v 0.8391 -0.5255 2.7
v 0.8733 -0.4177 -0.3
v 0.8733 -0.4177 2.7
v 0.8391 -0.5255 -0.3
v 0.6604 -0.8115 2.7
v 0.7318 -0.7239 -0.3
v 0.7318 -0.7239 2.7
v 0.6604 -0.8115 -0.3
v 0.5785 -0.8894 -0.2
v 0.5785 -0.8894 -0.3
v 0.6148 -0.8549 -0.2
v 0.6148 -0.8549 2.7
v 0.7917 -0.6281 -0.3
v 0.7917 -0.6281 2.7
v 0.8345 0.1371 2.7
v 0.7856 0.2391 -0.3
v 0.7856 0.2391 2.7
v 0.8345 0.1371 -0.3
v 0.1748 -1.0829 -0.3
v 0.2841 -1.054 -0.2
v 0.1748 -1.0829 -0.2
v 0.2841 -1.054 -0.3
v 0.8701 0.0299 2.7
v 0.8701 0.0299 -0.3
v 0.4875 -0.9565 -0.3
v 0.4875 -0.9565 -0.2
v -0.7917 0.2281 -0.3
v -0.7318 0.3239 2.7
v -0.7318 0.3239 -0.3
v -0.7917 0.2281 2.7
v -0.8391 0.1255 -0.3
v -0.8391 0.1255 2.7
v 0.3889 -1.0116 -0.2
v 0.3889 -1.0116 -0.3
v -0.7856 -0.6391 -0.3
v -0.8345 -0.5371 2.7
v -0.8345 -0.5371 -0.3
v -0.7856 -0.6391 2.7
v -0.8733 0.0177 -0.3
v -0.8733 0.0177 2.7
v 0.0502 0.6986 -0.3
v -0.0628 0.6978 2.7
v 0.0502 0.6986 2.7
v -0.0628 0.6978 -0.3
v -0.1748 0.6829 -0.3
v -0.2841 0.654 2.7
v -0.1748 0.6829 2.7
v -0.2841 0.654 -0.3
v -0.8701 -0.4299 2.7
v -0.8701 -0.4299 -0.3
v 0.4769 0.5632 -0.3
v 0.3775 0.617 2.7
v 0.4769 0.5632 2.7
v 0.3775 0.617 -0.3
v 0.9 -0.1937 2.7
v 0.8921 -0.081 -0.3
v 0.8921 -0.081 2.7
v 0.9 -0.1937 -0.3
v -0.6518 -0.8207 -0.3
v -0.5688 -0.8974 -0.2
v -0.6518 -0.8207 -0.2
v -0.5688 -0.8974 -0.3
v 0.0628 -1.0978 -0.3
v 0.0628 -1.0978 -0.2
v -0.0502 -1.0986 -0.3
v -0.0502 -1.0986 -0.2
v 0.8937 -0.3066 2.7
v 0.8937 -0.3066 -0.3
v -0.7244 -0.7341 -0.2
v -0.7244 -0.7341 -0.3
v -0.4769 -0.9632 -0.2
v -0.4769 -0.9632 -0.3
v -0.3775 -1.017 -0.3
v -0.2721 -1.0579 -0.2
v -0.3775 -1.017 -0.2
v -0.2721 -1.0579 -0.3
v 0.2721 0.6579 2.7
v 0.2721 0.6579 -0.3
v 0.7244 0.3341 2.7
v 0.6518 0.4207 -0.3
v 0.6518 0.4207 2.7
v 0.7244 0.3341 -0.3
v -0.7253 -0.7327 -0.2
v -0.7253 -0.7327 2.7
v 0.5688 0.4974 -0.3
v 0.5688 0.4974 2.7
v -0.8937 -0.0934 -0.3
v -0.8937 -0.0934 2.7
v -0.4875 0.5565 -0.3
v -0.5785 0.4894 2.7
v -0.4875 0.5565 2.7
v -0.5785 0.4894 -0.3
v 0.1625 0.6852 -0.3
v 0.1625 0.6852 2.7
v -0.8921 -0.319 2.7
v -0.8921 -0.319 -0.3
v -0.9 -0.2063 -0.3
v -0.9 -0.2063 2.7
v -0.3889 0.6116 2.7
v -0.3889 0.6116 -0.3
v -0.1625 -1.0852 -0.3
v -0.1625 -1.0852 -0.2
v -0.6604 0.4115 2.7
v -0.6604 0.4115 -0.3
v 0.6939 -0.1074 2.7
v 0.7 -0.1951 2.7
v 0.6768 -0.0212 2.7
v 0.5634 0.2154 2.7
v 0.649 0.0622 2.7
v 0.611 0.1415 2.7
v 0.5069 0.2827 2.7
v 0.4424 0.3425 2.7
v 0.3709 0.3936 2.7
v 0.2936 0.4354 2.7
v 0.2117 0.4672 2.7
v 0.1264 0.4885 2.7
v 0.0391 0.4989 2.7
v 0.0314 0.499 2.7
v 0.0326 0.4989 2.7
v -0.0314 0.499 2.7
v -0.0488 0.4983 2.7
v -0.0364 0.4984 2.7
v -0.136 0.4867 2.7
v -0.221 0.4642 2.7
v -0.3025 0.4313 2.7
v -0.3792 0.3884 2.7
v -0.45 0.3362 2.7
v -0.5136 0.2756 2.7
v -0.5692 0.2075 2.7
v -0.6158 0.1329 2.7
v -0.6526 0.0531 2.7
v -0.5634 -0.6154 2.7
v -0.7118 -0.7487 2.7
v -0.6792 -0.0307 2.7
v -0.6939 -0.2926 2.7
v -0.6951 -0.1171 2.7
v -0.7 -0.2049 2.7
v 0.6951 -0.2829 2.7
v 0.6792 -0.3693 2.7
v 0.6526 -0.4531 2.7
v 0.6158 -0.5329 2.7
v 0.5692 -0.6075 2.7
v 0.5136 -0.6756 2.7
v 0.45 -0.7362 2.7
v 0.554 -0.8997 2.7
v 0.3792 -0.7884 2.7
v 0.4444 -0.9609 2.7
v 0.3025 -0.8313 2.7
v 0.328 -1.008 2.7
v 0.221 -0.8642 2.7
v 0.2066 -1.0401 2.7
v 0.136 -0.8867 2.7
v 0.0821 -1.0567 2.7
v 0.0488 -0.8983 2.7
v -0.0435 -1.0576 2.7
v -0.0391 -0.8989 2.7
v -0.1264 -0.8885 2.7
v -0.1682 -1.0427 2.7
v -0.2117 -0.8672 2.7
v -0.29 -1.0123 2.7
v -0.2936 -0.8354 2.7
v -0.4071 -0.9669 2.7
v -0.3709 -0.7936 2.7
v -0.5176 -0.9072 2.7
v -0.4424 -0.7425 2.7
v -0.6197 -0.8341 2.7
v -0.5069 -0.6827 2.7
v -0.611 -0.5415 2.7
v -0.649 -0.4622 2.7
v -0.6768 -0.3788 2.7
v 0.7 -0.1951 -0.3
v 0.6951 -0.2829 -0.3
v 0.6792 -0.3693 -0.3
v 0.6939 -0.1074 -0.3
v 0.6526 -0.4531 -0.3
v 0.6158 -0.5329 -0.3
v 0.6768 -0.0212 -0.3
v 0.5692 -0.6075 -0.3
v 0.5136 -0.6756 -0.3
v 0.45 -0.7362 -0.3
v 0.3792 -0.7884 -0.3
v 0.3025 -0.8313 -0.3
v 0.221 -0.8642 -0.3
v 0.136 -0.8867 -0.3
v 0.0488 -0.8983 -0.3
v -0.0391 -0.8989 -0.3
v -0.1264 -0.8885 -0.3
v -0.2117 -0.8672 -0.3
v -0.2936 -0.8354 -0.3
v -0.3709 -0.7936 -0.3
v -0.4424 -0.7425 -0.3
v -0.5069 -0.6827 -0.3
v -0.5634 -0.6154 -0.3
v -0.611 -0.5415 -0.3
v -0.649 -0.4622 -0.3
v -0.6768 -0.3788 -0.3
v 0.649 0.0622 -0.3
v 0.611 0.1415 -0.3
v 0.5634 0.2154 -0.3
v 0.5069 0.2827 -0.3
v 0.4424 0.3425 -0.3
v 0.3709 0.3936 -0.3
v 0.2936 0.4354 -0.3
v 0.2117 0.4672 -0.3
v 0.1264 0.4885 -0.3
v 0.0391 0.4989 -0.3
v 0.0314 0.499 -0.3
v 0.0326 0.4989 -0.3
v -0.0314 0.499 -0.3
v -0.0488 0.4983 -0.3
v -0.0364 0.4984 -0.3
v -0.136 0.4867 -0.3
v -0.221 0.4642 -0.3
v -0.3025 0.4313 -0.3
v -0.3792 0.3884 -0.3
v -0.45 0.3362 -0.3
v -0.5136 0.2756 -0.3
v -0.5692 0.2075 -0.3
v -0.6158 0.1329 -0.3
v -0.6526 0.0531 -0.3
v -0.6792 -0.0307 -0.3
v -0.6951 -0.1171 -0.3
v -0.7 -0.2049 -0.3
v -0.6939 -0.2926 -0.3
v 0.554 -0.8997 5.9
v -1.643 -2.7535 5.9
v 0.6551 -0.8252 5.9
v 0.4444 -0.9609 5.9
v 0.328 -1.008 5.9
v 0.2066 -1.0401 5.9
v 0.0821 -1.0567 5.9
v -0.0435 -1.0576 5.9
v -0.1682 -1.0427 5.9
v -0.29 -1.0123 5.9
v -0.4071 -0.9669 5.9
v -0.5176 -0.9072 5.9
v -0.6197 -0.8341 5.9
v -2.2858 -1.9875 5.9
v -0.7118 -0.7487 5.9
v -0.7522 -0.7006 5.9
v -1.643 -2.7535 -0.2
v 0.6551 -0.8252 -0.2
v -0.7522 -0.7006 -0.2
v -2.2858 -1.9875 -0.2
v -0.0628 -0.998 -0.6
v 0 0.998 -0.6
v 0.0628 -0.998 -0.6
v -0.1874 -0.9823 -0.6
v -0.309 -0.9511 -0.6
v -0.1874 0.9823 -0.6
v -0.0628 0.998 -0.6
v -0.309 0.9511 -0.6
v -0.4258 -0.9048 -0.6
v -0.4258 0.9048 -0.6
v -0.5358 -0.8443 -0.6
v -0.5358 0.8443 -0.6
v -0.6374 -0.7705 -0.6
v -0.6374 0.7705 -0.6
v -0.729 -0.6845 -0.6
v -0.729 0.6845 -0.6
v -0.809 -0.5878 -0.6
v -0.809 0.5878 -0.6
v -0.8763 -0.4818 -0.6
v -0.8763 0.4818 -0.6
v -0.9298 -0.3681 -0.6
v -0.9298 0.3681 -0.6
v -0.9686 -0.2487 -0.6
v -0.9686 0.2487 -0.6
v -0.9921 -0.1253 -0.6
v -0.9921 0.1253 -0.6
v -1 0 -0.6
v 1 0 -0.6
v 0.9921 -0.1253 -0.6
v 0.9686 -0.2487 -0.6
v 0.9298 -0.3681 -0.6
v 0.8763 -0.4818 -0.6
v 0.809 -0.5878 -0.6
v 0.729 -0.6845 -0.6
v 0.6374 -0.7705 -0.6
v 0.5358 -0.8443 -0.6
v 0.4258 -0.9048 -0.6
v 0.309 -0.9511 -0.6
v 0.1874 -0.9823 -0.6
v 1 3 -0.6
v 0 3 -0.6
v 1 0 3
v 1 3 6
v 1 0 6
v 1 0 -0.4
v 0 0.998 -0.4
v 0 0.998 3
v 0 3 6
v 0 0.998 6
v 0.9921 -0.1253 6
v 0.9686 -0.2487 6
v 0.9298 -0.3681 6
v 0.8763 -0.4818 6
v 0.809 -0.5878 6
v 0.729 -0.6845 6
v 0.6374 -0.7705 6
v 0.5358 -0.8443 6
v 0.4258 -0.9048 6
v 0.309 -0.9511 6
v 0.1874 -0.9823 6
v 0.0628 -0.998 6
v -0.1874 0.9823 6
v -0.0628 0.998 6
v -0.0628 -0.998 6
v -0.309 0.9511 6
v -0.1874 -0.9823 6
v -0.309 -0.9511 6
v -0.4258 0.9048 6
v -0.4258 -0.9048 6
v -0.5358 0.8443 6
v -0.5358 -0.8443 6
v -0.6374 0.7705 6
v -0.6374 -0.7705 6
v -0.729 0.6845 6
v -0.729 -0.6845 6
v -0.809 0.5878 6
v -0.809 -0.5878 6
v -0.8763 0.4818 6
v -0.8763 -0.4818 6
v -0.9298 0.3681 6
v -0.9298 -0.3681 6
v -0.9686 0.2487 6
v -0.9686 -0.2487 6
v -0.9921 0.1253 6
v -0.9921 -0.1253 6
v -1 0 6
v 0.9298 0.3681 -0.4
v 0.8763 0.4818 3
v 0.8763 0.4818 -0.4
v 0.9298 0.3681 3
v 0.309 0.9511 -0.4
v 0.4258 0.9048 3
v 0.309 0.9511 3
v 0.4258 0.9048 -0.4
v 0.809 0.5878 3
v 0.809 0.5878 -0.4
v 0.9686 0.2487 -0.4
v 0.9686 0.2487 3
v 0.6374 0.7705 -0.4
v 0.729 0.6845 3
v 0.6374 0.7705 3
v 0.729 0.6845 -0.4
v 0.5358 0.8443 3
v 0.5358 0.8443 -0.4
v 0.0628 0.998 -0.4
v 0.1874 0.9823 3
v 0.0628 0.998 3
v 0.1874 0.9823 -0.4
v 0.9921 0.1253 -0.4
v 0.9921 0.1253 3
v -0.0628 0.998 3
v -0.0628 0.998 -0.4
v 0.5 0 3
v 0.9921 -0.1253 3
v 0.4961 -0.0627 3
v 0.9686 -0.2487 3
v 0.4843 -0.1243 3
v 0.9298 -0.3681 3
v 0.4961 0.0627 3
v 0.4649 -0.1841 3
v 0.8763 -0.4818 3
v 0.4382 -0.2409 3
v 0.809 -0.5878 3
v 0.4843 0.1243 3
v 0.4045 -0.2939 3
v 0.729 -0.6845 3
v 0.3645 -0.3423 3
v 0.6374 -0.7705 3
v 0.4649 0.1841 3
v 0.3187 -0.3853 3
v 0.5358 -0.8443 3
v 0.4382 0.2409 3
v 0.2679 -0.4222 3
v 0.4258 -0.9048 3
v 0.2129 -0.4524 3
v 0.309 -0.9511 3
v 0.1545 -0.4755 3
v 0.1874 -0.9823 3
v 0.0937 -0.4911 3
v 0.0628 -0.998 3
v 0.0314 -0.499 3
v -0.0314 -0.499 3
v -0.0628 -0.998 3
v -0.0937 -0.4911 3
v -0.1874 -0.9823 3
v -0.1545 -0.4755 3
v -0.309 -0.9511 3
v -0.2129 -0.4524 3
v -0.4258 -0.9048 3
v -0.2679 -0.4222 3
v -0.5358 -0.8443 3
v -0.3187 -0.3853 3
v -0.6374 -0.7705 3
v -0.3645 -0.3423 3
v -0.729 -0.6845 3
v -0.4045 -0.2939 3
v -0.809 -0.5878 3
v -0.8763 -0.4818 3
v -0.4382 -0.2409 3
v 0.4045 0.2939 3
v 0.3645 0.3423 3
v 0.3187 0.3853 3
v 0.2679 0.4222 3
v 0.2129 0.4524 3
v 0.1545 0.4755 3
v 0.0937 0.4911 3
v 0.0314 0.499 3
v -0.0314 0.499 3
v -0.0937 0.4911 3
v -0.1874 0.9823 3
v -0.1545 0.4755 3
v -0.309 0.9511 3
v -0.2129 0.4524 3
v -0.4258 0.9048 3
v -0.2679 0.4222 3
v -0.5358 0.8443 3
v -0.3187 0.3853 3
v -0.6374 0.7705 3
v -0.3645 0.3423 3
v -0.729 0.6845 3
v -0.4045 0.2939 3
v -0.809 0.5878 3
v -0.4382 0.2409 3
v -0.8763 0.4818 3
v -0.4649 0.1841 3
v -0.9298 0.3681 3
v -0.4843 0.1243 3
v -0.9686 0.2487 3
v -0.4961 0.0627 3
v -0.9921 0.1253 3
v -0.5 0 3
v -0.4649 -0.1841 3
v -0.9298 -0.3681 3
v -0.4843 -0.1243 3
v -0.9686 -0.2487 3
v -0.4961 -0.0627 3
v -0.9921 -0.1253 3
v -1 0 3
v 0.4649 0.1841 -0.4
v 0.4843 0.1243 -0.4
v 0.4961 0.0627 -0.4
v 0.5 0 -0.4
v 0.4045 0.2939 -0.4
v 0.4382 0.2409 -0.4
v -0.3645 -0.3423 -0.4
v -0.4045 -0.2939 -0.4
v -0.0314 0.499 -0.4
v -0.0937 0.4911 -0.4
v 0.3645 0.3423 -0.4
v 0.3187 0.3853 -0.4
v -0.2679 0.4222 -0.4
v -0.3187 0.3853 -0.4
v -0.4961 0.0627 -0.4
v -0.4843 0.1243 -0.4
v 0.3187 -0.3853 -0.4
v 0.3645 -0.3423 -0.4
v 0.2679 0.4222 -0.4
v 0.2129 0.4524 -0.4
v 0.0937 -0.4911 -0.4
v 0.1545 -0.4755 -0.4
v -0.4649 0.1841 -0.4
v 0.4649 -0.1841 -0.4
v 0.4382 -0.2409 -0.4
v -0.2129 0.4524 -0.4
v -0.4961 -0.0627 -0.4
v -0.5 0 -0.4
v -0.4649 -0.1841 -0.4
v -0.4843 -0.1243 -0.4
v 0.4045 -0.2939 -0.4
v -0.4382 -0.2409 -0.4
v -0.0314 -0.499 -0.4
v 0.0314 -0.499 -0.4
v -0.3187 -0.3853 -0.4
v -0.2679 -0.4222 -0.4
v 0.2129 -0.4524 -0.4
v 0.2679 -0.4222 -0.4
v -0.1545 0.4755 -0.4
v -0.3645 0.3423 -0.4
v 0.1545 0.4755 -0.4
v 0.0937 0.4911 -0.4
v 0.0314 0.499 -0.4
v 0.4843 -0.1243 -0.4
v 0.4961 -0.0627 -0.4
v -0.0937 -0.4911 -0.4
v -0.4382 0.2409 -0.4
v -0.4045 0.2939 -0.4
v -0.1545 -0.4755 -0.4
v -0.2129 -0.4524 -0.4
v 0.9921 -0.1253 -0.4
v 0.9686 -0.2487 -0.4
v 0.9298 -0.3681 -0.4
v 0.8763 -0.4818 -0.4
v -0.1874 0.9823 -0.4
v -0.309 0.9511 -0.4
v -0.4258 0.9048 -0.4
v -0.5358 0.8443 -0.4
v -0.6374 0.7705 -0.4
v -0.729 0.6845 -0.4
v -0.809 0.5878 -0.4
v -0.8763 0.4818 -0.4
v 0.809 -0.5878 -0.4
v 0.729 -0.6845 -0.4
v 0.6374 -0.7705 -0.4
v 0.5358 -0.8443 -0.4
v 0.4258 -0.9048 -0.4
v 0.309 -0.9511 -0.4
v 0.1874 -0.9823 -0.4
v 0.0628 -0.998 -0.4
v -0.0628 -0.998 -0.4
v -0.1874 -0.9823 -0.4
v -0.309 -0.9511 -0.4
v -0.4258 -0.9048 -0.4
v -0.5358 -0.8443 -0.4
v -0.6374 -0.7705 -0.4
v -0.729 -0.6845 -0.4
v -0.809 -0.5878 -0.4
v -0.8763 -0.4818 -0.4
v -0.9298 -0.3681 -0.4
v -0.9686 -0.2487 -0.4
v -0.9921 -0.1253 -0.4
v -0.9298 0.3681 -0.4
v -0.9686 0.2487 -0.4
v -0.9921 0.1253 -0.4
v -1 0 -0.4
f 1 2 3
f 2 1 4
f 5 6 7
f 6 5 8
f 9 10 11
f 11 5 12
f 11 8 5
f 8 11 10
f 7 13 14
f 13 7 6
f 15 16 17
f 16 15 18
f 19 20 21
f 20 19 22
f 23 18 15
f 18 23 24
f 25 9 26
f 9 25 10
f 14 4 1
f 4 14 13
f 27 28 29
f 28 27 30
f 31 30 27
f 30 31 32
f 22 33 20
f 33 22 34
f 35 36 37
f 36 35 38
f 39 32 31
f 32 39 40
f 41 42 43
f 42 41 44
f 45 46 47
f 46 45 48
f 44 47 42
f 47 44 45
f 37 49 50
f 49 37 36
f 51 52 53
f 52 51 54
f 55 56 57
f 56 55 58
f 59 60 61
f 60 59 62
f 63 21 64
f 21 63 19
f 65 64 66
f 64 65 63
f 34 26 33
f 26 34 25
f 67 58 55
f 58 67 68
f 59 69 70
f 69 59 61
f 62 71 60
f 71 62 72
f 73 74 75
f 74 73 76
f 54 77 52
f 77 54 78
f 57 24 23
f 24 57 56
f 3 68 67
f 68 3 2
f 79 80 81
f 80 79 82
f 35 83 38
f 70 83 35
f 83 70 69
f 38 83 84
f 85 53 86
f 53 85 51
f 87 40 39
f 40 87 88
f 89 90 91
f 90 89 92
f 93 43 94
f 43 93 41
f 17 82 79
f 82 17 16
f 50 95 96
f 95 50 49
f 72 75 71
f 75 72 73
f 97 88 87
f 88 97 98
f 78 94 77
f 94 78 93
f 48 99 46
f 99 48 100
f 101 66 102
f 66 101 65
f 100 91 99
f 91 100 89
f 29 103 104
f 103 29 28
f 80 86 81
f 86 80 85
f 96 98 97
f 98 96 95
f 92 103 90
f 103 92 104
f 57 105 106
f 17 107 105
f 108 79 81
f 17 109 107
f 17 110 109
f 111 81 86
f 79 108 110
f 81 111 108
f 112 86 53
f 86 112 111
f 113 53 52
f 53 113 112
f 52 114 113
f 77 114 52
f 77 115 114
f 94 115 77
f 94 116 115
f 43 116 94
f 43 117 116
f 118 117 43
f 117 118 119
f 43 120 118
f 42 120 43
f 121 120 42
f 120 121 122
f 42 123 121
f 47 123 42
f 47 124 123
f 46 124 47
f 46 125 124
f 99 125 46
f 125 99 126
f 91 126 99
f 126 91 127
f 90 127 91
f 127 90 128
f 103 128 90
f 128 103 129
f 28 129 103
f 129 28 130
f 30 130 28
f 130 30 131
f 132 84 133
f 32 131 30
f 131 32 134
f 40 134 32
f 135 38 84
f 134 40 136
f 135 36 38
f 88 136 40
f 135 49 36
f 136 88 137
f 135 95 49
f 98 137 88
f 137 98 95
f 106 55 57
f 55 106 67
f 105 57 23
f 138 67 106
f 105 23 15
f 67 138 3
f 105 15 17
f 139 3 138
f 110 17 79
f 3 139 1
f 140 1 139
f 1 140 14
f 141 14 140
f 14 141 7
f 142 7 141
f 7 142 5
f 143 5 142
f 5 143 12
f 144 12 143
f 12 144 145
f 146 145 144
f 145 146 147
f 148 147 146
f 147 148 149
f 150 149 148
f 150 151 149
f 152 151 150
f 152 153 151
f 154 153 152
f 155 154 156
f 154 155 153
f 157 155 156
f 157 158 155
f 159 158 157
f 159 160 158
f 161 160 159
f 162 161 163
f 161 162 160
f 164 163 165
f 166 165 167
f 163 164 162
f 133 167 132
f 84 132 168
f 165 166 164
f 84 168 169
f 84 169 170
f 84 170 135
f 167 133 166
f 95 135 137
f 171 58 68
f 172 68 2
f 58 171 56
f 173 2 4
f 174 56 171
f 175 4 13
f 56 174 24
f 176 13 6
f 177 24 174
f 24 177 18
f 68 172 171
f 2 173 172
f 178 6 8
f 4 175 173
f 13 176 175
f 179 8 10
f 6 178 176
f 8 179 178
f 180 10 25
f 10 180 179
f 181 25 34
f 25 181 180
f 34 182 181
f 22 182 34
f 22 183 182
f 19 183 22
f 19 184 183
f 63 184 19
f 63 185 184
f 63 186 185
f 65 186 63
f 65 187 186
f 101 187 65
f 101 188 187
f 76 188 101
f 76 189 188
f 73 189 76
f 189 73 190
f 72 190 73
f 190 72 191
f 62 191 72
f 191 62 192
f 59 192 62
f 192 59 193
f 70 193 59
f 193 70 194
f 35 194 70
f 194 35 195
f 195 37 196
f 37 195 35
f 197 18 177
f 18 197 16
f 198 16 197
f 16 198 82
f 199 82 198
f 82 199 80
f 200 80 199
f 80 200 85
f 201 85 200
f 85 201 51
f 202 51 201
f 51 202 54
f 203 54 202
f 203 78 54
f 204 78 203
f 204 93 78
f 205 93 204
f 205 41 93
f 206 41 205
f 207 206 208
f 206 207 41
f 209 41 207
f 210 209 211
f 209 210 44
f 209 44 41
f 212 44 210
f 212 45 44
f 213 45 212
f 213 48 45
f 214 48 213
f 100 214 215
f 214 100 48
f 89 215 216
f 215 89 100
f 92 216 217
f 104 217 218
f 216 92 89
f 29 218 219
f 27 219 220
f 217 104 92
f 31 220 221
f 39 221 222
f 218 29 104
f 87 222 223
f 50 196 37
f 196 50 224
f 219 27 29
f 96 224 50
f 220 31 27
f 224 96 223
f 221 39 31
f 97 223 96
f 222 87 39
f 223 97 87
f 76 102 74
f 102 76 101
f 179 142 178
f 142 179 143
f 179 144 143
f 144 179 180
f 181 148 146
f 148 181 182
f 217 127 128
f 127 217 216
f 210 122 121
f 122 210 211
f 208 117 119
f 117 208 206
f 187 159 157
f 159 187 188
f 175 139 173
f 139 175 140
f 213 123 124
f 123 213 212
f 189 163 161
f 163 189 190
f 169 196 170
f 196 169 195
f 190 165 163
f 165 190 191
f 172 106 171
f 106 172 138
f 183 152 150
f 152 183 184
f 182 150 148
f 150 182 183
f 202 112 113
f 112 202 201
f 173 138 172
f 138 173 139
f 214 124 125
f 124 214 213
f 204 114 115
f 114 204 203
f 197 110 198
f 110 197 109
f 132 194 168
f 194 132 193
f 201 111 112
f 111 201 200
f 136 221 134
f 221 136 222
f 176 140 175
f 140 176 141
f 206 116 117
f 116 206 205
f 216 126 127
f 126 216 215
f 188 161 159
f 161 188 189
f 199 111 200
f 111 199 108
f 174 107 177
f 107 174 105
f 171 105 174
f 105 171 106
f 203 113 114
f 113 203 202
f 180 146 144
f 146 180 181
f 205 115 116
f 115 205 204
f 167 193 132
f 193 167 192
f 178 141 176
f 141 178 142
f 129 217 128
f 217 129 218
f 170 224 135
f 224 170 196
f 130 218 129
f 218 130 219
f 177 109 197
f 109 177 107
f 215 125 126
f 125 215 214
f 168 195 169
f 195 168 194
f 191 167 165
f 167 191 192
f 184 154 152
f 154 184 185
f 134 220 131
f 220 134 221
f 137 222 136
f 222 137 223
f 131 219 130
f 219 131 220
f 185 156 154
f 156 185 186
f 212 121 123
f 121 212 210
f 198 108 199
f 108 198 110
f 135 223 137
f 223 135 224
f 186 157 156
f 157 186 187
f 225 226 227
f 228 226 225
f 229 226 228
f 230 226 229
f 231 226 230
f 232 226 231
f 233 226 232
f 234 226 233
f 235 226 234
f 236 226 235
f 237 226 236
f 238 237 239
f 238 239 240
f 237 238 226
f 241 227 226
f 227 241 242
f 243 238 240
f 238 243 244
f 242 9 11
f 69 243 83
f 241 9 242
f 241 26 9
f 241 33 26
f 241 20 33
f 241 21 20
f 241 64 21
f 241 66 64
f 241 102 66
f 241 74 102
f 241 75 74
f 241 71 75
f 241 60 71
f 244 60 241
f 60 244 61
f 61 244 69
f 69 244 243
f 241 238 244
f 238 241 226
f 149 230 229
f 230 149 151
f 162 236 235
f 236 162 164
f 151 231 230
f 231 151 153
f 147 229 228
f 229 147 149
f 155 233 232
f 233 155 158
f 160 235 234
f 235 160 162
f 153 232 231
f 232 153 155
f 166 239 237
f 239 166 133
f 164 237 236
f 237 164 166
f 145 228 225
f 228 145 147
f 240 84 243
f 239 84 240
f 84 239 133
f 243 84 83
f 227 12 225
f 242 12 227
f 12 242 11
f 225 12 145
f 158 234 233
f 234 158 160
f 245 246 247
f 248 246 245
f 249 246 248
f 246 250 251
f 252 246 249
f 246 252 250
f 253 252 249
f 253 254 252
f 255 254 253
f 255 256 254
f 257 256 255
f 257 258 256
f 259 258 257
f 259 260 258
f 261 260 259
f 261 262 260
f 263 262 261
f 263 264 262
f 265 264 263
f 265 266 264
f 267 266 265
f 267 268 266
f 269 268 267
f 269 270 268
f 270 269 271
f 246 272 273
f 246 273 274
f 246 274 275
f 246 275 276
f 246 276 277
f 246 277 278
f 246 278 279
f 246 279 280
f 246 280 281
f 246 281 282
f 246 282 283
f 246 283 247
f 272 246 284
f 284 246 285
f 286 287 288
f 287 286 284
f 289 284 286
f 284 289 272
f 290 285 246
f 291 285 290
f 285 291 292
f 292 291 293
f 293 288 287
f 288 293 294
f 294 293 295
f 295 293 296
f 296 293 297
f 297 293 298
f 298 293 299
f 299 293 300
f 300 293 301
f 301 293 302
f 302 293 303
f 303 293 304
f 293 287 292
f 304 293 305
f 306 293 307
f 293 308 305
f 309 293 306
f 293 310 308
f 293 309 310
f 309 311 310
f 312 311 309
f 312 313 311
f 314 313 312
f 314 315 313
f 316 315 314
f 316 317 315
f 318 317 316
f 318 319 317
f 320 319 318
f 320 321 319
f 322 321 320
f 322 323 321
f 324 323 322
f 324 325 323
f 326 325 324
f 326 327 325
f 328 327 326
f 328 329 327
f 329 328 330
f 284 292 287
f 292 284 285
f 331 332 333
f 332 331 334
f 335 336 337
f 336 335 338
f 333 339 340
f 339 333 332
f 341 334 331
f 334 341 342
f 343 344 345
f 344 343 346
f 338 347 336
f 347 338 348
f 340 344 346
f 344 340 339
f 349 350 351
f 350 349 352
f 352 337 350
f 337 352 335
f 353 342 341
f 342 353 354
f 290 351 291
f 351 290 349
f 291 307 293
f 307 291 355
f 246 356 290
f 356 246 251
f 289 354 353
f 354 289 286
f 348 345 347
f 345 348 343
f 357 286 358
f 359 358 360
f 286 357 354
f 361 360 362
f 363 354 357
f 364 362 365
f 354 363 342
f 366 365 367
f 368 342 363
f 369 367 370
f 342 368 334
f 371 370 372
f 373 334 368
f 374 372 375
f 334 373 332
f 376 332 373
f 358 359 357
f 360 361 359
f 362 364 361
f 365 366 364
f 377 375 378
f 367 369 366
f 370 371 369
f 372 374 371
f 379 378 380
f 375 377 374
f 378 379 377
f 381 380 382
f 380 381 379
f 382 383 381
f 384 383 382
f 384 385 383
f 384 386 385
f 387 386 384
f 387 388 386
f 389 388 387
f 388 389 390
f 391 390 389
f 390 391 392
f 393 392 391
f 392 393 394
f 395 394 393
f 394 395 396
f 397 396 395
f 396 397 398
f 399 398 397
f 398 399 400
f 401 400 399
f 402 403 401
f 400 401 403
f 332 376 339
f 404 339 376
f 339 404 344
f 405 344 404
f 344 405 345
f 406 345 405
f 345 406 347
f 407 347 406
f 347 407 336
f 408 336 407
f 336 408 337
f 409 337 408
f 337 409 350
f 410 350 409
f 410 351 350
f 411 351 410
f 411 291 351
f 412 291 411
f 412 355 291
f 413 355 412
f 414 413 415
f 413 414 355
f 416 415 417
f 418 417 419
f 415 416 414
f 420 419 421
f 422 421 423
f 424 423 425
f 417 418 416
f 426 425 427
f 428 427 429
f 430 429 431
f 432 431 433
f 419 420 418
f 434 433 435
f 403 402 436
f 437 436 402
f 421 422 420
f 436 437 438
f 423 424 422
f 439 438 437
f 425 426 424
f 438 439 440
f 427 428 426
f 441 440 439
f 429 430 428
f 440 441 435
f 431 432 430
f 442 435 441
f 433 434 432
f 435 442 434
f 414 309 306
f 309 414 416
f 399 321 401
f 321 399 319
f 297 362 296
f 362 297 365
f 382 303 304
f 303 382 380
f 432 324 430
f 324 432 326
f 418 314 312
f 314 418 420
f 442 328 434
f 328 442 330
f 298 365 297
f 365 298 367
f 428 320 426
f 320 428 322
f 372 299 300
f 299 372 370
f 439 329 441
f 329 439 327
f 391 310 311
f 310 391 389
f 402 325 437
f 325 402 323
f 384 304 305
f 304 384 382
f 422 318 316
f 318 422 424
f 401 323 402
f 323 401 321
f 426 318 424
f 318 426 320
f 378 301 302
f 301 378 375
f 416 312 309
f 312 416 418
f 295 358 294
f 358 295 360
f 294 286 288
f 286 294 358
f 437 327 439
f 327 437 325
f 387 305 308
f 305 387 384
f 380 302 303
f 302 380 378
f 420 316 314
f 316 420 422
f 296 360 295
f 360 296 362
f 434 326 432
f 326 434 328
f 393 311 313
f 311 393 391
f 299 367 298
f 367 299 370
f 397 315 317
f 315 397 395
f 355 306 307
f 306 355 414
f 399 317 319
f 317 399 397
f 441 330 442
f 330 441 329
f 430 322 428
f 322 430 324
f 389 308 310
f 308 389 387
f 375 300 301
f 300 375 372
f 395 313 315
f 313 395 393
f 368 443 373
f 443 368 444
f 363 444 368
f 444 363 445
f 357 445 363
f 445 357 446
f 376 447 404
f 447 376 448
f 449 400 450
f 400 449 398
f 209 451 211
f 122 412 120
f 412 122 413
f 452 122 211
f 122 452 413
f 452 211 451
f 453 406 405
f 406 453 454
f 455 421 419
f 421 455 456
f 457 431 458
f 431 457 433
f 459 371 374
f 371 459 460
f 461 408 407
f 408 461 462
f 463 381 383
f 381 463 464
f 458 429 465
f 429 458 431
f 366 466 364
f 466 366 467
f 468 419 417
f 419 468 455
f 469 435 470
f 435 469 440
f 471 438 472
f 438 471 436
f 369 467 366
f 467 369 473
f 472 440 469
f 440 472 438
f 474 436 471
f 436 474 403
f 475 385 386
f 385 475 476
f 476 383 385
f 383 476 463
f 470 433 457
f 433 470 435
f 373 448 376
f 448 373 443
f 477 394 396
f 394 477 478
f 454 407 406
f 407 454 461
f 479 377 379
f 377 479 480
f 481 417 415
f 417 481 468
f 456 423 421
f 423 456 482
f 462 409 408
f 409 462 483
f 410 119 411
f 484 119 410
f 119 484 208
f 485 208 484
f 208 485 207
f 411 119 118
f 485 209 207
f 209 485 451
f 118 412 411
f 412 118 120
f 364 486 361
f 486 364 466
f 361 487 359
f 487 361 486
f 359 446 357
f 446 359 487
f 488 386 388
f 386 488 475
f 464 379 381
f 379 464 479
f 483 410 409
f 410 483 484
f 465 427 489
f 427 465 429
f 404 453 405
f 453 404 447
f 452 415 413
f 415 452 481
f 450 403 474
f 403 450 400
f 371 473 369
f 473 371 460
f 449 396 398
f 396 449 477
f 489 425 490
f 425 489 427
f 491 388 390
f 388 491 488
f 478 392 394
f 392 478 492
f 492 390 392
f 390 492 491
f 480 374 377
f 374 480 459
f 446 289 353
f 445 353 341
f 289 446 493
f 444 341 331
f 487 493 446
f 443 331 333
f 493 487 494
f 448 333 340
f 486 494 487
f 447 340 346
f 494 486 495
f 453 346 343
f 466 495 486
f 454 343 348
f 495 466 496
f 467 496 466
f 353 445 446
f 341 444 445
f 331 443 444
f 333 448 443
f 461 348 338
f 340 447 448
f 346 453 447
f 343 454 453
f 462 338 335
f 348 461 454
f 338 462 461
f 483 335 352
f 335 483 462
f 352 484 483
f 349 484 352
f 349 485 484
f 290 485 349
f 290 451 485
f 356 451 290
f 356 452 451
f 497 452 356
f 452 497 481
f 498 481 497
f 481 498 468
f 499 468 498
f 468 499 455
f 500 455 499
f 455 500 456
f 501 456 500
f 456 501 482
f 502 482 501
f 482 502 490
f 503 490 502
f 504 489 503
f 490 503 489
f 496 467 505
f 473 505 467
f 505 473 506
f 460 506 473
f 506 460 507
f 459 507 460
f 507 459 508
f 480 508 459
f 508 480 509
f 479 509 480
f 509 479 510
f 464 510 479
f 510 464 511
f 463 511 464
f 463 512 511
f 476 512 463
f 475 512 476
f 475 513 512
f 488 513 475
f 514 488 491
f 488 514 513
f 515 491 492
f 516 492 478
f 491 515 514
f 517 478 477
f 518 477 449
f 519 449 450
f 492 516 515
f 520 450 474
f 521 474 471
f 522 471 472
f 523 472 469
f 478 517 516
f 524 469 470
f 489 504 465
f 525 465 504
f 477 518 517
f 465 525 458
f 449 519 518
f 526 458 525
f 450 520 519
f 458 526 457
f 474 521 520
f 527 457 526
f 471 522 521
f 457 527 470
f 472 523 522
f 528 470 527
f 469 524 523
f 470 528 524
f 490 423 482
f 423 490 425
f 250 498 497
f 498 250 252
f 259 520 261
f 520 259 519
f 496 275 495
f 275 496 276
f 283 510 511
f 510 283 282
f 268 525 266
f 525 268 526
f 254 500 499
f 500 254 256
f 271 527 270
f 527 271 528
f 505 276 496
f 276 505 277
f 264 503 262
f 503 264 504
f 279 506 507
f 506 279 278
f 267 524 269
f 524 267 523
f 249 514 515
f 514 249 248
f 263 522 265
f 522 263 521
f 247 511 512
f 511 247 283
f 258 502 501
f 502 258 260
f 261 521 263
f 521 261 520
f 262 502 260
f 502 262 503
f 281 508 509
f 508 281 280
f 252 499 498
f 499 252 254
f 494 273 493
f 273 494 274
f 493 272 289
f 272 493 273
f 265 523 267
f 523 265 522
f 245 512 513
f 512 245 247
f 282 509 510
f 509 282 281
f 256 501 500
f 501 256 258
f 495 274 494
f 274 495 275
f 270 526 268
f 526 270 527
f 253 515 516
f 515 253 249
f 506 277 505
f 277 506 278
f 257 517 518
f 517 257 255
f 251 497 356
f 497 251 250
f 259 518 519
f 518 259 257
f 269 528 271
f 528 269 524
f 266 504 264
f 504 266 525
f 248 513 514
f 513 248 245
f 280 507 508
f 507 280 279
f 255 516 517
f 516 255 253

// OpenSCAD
module block_long() { //long block
	difference(){
		cube([6.6, 3, 1]);
		
		translate([-1,0,0])
			rotate([0,270,180])
			cylinder(h=8, r=1, $fn=50);
	}
}

module block_short() { //long block
	difference(){
		cube([6.1,3,1]);
		
		translate([-1,0,0])
			rotate([0,270,180])
			cylinder(h=8, r=1, $fn=50);
	}
}

module cylinder_bottom(){
	difference(){
		cylinder(h=3, r=0.9, $fn=50);

		translate([0,0,-1])
			cylinder(h=8, r=0.7, $fn=50);
	}

	translate([-.1, .1, .1])
	rotate([0,270,180])
		block_short();
}

module cylinder_top(){

	translate([0,0,3])
		cylinder(h=3, r=1, $fn=50);
	translate([0,0,-.4]) //innder dowel
		cylinder(h=6.4, r=.5, $fn=50);

	translate([0, 0, 6])
		rotate([0,90,0])
			block_long();
	translate([0,0,-.6])

	cylinder(h=.2, r=1, $fn=50);
}

color("blue")
translate([0,-.2,-0.3])
	rotate([0,0, -50])
	cylinder_bottom();


cylinder_top();
